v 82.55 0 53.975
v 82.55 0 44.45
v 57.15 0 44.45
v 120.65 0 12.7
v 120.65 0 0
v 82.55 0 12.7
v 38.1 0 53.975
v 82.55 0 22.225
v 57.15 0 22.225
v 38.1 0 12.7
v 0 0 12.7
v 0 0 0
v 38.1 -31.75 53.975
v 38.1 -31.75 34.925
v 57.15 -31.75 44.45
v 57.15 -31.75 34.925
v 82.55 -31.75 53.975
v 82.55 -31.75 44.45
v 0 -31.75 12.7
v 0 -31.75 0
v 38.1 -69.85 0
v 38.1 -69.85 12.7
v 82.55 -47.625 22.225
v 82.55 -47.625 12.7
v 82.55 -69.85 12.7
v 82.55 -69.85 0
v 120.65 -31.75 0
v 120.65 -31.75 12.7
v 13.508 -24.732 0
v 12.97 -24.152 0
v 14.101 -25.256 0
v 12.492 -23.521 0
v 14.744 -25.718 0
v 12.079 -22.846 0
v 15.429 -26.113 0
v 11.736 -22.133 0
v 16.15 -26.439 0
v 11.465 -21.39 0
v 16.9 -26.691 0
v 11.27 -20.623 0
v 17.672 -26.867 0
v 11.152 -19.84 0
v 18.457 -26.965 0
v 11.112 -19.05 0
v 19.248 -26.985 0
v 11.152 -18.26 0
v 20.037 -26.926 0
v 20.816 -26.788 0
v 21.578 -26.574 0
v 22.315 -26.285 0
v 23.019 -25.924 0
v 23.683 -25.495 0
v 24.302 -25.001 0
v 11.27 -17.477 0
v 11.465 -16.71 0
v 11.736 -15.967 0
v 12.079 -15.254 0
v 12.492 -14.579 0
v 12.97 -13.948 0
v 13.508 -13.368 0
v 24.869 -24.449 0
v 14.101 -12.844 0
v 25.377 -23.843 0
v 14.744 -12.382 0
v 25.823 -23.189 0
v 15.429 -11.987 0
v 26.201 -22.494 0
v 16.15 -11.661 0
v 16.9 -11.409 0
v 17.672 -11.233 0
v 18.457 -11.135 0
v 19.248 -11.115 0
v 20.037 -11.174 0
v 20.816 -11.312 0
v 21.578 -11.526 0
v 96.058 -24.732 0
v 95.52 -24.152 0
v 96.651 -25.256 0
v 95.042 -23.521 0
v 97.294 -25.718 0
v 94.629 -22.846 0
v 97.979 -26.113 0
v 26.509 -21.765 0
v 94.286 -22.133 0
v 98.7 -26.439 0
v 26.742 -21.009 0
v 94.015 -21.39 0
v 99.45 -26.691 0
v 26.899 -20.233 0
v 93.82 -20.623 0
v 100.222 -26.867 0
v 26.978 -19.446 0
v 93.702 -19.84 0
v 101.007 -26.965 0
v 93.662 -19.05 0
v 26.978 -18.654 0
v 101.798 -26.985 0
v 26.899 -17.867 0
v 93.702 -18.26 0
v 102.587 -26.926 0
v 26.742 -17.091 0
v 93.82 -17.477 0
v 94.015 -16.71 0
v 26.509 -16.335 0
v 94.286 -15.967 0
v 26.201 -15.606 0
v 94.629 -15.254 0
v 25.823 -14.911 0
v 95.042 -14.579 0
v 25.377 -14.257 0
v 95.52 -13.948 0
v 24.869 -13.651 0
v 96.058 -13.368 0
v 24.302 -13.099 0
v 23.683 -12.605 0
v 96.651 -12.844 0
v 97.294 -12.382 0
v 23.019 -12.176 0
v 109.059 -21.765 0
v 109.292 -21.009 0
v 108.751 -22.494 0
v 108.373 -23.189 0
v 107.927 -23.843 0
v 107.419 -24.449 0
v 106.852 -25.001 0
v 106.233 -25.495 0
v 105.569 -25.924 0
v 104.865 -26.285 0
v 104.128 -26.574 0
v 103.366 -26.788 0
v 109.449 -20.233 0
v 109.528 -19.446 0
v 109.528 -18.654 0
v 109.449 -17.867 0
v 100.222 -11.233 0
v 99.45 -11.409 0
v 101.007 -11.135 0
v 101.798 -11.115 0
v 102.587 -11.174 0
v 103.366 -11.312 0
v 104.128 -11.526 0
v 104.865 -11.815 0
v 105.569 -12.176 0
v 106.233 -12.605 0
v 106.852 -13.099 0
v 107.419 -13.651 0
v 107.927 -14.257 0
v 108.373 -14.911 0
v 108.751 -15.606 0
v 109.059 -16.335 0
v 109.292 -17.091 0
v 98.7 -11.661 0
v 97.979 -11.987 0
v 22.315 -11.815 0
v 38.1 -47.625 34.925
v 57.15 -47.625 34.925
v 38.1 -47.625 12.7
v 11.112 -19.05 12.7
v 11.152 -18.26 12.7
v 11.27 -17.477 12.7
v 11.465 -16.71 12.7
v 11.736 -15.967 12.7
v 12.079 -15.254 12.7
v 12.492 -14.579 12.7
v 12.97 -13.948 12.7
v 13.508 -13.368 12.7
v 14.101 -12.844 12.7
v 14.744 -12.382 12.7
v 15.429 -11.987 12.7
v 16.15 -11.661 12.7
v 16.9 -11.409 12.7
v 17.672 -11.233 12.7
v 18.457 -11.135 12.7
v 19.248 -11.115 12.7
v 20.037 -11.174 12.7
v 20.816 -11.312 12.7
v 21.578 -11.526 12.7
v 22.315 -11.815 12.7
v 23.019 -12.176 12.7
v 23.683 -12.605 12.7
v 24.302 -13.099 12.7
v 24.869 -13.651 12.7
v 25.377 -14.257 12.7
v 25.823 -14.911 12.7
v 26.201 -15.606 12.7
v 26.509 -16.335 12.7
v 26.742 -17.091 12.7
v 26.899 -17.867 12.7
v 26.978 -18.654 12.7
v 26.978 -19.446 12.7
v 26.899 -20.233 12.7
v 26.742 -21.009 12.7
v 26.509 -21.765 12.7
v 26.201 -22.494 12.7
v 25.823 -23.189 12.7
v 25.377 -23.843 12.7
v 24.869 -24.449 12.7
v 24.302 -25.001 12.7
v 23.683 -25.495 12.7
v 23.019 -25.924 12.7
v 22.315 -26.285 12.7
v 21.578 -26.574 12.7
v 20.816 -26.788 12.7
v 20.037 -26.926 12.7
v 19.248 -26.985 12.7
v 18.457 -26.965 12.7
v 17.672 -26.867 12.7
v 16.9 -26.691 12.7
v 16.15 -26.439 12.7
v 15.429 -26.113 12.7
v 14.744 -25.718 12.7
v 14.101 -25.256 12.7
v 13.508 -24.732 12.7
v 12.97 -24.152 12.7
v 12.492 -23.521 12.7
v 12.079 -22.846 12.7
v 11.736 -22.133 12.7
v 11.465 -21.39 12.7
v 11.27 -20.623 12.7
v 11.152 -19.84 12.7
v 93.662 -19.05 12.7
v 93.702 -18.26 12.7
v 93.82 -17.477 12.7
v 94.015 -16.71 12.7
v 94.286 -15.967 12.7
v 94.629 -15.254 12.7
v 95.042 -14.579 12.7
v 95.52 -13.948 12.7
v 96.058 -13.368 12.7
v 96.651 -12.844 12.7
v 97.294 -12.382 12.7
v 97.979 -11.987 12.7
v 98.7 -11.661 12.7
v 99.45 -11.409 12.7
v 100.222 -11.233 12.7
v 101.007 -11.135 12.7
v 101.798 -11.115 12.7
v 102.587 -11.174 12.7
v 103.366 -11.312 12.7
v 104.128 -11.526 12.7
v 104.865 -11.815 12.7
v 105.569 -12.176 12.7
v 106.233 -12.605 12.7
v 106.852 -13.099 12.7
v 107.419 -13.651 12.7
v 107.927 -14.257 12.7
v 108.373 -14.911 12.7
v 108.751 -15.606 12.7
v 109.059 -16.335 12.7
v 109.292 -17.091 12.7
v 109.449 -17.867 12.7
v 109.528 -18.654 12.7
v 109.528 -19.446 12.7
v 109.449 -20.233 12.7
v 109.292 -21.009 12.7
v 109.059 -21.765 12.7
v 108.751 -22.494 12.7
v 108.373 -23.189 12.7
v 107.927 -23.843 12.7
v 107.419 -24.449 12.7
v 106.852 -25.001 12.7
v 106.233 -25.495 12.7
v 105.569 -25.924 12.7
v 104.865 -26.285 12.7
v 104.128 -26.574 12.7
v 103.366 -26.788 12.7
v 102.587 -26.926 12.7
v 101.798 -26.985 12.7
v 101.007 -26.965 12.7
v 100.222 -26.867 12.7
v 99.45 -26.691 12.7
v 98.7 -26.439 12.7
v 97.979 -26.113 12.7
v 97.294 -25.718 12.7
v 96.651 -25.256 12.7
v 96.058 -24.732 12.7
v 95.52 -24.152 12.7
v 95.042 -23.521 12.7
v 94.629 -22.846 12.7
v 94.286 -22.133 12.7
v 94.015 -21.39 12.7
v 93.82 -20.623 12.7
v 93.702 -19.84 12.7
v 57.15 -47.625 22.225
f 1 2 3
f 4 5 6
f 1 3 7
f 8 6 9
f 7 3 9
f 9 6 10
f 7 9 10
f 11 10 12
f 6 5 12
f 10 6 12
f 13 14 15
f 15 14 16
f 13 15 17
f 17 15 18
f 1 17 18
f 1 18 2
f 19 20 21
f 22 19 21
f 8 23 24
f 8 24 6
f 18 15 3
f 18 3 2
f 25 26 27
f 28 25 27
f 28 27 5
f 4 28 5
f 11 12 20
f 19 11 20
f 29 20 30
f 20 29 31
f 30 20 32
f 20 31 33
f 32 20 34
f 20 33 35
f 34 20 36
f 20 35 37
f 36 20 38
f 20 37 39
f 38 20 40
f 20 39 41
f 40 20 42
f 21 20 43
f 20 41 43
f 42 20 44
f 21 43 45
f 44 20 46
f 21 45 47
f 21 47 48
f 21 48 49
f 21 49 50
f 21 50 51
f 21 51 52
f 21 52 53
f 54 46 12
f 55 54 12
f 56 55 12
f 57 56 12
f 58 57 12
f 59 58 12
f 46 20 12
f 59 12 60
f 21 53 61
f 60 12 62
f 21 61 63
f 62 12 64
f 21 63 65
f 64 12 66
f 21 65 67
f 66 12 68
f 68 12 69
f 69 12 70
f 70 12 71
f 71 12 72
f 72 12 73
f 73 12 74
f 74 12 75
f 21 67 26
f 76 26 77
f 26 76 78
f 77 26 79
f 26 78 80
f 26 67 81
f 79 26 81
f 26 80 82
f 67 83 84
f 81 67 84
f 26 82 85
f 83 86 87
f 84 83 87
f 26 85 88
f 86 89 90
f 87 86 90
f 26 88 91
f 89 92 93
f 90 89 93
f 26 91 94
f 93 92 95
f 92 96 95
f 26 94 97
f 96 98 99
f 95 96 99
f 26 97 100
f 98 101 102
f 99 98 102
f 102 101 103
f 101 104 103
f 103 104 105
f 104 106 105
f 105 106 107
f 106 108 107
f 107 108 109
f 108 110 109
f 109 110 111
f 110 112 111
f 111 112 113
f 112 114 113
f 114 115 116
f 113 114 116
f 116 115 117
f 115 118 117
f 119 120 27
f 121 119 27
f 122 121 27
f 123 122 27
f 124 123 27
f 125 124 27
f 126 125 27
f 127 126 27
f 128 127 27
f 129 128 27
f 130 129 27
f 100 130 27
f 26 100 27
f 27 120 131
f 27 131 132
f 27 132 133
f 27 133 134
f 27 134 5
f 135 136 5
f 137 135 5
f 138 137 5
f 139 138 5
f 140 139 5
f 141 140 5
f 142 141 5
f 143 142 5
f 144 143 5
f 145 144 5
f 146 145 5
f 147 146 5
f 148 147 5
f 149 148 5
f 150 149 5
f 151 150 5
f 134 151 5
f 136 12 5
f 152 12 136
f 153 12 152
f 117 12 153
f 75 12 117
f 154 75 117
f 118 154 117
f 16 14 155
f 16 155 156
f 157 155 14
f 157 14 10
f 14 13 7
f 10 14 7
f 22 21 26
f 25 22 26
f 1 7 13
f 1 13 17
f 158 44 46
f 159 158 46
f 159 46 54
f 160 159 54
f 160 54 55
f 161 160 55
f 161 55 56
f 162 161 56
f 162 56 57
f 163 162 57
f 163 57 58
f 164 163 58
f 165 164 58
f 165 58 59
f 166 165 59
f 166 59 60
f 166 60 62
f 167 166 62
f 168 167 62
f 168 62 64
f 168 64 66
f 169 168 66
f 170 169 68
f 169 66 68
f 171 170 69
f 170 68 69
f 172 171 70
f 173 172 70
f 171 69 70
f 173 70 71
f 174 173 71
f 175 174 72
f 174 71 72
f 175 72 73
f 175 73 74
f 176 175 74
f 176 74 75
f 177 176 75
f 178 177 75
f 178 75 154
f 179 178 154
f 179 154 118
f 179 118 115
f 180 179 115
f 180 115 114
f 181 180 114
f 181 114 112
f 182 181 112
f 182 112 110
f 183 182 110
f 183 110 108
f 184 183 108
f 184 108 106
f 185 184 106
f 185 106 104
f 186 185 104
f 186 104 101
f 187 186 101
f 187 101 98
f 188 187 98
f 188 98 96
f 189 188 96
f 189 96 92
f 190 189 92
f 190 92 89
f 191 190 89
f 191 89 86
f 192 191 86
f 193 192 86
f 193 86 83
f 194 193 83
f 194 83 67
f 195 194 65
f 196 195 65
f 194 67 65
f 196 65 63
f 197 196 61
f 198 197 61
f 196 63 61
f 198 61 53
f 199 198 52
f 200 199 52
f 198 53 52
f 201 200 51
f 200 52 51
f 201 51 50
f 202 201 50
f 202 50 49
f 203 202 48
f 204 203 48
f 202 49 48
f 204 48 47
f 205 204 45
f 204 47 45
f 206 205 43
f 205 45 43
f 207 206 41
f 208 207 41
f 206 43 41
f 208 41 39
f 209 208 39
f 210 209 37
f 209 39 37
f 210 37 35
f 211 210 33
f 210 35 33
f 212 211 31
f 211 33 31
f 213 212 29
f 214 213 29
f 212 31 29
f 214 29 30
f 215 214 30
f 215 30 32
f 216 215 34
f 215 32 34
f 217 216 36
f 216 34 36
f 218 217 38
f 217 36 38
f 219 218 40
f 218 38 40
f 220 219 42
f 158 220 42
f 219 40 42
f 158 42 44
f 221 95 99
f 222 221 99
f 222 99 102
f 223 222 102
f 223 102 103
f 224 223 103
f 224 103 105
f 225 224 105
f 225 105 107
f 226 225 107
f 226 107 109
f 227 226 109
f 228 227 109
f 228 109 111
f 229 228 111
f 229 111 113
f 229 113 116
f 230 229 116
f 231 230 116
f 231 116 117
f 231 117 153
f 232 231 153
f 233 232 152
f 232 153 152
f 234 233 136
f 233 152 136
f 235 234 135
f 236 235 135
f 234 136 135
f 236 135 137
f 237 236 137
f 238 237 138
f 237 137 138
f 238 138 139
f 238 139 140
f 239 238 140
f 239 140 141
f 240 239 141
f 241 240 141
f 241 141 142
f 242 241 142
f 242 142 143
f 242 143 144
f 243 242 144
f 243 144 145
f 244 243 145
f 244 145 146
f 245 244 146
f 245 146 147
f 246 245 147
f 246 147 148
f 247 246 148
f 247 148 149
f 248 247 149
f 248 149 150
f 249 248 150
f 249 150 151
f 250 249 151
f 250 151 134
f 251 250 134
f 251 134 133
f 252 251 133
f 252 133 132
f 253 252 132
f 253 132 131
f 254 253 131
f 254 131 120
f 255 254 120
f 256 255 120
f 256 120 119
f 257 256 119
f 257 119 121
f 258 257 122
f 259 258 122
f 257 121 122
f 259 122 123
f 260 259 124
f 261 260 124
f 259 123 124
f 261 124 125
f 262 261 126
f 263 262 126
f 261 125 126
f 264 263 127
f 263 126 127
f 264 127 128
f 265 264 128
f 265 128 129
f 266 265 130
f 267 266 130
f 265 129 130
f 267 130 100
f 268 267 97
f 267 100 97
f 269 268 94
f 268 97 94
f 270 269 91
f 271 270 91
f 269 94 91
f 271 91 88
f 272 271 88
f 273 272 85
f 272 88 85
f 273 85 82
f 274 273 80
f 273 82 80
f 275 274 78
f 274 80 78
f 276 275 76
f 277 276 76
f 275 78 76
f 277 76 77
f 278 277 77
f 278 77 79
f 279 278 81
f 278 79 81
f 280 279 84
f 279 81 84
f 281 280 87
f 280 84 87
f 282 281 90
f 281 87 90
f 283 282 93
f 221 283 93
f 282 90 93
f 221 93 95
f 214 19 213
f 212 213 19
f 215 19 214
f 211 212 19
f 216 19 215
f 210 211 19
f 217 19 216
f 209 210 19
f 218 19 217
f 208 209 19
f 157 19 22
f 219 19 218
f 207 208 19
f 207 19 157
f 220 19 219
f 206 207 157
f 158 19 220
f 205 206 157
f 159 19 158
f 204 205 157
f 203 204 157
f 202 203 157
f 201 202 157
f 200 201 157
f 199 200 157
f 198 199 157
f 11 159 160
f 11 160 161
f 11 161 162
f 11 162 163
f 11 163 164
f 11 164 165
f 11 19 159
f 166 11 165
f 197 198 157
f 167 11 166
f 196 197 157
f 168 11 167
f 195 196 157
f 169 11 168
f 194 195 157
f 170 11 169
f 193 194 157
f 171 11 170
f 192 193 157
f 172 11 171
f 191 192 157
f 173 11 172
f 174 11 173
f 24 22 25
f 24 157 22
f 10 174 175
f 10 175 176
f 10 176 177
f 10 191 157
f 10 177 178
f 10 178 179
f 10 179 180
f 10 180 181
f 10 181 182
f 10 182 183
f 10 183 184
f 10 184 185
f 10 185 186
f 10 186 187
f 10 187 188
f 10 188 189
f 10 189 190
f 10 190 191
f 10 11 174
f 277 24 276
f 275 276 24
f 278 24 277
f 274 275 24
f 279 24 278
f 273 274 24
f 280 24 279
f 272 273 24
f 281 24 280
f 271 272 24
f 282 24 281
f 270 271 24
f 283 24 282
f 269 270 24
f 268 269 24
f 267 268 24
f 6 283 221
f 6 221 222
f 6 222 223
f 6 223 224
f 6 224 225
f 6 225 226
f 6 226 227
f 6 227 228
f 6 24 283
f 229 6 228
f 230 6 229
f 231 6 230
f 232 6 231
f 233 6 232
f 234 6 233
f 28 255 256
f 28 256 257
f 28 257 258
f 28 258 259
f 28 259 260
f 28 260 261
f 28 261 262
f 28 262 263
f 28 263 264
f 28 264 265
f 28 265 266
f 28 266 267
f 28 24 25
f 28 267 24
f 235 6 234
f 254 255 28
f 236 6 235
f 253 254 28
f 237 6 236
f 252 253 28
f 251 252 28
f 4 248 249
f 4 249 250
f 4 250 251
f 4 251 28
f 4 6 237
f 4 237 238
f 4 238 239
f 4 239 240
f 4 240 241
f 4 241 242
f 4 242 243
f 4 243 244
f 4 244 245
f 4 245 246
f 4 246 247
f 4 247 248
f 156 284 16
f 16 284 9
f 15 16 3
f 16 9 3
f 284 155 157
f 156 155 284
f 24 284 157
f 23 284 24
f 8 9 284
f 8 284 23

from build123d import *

# Parameters (mm, degrees)
F1_DEPTH      = 12.7
F3_D          = 15.875
F4_W          = 44.45
F4_H          = 31.75
F5_DEPTH      = 41.275
F8_START      = -19.05
F7_W          = 44.45
F7_H          = 15.875
F8_DEPTH      = 22.225
F6_W          = 25.4
F6_H          = 22.225
F9_DEPTH      = 31.751
F9_DEPTH_BACK = 38.101


with BuildPart() as f1:
    # F0 (on Top) → F1 (new body)
    with BuildSketch(Plane.XY):
        Polygon((120.65, 0), (0, 0), (0, -31.75), (38.1, -69.85), (82.55, -69.85), (120.65, -31.75), align=None)
    extrude(amount=F1_DEPTH)

    # F3 (through all)
    with Locations(Plane.XY.offset(12.7)):
        with Locations((19.05, -19.05), (101.6, -19.05)):
            Hole(F3_D / 2)

    # F4 (on face) → F5 (join)
    with BuildSketch(Plane.XY.offset(12.7)):
        with Locations((60.325, -15.875)):
            Rectangle(F4_W, F4_H)
    extrude(amount=F5_DEPTH)

    # F7 (on face) → F8 (join)
    with BuildSketch(Plane.XY.offset(53.975).offset(F8_START)):
        with Locations((60.325, -39.6875)):
            Rectangle(F7_W, F7_H)
    extrude(amount=-F8_DEPTH)

    # F6 (on face) → F9 (cut, two sides)
    with BuildSketch(Plane.XZ.offset(31.75)) as f9_sk:
        with Locations((69.85, 33.3375)):
            Rectangle(F6_W, F6_H)
    extrude(amount=-F9_DEPTH, mode=Mode.SUBTRACT)
    extrude(f9_sk.sketch, amount=F9_DEPTH_BACK, mode=Mode.SUBTRACT)


solid = f1.part
